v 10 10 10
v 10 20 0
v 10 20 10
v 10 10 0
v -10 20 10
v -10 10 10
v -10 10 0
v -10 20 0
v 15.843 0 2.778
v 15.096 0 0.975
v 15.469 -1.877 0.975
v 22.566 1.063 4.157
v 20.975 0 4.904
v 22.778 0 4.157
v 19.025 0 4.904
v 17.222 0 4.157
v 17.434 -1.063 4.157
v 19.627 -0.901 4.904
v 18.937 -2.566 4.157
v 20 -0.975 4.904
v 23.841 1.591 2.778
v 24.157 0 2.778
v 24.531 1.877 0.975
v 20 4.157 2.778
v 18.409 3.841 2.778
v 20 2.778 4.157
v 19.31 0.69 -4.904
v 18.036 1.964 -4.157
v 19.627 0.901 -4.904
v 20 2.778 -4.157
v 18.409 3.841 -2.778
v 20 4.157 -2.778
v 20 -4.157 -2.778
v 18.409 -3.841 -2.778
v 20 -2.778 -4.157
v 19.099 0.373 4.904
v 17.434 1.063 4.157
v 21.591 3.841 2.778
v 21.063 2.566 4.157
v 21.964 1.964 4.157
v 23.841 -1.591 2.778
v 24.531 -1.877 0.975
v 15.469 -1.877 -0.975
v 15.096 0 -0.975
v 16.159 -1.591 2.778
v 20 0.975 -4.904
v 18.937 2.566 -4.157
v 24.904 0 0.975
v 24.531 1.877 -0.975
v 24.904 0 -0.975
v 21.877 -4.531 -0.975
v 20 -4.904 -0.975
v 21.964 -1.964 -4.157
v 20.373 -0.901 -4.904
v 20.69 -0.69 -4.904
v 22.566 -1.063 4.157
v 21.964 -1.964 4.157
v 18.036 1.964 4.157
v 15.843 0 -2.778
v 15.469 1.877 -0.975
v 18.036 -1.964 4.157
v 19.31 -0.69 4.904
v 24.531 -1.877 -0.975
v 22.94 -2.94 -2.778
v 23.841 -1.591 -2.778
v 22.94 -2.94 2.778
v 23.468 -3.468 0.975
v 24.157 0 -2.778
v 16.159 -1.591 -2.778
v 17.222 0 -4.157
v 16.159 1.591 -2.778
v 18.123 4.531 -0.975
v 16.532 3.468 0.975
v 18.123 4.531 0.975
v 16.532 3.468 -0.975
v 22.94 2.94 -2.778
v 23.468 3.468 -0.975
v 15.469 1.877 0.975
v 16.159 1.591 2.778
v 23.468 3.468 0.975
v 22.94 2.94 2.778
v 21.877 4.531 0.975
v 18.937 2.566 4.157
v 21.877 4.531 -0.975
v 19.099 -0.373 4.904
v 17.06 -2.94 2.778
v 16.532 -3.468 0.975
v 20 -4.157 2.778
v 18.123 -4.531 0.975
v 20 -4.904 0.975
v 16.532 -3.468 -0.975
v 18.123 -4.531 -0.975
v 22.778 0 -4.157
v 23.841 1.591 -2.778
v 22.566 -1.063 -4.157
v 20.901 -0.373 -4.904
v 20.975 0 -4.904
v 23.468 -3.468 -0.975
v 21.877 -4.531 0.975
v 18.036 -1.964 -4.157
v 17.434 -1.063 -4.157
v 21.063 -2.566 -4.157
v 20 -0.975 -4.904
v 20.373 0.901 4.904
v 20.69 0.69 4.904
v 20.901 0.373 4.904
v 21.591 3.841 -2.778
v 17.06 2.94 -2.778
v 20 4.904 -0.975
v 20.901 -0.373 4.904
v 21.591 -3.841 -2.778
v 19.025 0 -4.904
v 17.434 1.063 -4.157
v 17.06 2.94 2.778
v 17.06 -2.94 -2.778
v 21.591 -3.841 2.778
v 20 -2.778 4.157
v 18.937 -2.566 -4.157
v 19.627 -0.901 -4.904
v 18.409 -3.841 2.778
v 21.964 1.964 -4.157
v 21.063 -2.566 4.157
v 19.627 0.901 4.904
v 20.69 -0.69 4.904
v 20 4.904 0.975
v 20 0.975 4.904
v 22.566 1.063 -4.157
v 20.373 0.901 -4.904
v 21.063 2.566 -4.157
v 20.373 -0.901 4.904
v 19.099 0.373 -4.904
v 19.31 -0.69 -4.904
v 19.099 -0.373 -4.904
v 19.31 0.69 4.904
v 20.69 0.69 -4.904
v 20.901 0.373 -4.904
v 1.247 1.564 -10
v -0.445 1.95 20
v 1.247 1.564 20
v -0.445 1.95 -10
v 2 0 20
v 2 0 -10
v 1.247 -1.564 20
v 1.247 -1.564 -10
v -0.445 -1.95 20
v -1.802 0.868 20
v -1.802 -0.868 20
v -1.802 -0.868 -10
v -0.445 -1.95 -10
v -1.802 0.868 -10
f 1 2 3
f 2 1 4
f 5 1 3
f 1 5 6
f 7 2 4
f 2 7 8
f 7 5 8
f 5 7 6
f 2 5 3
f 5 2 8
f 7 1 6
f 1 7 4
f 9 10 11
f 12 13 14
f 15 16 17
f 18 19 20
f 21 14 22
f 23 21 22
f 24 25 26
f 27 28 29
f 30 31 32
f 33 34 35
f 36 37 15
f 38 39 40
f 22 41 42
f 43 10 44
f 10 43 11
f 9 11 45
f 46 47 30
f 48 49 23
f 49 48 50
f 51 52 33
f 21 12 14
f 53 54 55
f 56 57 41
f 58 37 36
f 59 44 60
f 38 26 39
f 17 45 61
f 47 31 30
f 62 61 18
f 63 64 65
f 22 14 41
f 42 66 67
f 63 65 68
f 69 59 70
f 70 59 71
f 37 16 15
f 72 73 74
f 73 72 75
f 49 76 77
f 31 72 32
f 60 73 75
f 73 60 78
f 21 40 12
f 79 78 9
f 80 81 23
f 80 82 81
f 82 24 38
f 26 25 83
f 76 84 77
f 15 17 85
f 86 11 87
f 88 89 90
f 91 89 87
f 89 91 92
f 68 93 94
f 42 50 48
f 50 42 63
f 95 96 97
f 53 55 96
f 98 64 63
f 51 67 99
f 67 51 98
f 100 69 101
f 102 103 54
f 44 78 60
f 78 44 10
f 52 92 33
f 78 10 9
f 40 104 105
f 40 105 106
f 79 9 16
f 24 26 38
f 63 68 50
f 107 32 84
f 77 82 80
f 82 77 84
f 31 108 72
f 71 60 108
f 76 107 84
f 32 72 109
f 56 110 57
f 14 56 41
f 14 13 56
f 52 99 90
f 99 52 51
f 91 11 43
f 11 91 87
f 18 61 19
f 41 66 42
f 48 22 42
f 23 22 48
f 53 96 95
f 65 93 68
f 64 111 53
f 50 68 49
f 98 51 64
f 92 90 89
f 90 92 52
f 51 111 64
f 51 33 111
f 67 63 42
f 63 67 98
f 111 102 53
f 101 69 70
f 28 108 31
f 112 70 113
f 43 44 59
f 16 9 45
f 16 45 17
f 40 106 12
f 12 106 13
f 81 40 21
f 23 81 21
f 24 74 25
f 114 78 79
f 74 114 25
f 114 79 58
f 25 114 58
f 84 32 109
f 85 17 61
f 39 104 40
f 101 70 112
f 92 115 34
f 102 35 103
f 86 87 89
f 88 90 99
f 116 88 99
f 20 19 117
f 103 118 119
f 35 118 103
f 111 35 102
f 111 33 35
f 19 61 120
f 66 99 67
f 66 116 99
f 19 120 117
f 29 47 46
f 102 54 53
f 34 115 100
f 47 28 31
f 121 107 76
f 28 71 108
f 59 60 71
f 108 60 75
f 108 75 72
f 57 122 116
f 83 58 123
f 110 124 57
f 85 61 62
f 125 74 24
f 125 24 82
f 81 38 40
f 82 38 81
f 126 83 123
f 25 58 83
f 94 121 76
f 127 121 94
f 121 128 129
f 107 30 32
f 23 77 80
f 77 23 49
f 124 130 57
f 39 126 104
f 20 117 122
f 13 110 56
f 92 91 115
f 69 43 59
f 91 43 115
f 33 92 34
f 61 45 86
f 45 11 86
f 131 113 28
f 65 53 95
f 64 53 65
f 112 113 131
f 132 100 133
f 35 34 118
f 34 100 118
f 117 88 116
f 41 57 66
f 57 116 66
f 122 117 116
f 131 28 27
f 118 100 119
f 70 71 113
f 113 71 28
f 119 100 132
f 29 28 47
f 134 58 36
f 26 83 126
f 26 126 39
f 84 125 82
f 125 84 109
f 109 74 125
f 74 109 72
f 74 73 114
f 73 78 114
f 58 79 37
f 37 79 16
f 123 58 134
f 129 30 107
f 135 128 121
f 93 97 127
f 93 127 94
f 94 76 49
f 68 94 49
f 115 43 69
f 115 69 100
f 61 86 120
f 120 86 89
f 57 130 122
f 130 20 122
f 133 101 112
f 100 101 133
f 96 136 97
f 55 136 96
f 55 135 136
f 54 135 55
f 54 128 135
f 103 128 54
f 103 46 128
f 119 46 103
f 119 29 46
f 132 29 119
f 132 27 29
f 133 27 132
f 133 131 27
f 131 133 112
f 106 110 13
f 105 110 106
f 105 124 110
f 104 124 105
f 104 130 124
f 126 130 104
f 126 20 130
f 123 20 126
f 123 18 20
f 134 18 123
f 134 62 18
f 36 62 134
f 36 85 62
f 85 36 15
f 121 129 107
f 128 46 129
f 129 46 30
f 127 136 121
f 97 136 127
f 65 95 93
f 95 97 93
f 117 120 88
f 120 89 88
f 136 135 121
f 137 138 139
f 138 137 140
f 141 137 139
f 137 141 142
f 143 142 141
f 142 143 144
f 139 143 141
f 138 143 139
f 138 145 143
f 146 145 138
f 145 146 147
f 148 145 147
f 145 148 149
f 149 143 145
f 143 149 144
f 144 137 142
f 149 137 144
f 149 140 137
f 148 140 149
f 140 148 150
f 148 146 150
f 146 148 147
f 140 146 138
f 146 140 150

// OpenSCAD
translate([-10, 10, 0])
	cube([20, 10, 10]);
translate([20, 0, 0])
	sphere(5);
translate([0, 0, -10])
	cylinder(h=30, r=2);
